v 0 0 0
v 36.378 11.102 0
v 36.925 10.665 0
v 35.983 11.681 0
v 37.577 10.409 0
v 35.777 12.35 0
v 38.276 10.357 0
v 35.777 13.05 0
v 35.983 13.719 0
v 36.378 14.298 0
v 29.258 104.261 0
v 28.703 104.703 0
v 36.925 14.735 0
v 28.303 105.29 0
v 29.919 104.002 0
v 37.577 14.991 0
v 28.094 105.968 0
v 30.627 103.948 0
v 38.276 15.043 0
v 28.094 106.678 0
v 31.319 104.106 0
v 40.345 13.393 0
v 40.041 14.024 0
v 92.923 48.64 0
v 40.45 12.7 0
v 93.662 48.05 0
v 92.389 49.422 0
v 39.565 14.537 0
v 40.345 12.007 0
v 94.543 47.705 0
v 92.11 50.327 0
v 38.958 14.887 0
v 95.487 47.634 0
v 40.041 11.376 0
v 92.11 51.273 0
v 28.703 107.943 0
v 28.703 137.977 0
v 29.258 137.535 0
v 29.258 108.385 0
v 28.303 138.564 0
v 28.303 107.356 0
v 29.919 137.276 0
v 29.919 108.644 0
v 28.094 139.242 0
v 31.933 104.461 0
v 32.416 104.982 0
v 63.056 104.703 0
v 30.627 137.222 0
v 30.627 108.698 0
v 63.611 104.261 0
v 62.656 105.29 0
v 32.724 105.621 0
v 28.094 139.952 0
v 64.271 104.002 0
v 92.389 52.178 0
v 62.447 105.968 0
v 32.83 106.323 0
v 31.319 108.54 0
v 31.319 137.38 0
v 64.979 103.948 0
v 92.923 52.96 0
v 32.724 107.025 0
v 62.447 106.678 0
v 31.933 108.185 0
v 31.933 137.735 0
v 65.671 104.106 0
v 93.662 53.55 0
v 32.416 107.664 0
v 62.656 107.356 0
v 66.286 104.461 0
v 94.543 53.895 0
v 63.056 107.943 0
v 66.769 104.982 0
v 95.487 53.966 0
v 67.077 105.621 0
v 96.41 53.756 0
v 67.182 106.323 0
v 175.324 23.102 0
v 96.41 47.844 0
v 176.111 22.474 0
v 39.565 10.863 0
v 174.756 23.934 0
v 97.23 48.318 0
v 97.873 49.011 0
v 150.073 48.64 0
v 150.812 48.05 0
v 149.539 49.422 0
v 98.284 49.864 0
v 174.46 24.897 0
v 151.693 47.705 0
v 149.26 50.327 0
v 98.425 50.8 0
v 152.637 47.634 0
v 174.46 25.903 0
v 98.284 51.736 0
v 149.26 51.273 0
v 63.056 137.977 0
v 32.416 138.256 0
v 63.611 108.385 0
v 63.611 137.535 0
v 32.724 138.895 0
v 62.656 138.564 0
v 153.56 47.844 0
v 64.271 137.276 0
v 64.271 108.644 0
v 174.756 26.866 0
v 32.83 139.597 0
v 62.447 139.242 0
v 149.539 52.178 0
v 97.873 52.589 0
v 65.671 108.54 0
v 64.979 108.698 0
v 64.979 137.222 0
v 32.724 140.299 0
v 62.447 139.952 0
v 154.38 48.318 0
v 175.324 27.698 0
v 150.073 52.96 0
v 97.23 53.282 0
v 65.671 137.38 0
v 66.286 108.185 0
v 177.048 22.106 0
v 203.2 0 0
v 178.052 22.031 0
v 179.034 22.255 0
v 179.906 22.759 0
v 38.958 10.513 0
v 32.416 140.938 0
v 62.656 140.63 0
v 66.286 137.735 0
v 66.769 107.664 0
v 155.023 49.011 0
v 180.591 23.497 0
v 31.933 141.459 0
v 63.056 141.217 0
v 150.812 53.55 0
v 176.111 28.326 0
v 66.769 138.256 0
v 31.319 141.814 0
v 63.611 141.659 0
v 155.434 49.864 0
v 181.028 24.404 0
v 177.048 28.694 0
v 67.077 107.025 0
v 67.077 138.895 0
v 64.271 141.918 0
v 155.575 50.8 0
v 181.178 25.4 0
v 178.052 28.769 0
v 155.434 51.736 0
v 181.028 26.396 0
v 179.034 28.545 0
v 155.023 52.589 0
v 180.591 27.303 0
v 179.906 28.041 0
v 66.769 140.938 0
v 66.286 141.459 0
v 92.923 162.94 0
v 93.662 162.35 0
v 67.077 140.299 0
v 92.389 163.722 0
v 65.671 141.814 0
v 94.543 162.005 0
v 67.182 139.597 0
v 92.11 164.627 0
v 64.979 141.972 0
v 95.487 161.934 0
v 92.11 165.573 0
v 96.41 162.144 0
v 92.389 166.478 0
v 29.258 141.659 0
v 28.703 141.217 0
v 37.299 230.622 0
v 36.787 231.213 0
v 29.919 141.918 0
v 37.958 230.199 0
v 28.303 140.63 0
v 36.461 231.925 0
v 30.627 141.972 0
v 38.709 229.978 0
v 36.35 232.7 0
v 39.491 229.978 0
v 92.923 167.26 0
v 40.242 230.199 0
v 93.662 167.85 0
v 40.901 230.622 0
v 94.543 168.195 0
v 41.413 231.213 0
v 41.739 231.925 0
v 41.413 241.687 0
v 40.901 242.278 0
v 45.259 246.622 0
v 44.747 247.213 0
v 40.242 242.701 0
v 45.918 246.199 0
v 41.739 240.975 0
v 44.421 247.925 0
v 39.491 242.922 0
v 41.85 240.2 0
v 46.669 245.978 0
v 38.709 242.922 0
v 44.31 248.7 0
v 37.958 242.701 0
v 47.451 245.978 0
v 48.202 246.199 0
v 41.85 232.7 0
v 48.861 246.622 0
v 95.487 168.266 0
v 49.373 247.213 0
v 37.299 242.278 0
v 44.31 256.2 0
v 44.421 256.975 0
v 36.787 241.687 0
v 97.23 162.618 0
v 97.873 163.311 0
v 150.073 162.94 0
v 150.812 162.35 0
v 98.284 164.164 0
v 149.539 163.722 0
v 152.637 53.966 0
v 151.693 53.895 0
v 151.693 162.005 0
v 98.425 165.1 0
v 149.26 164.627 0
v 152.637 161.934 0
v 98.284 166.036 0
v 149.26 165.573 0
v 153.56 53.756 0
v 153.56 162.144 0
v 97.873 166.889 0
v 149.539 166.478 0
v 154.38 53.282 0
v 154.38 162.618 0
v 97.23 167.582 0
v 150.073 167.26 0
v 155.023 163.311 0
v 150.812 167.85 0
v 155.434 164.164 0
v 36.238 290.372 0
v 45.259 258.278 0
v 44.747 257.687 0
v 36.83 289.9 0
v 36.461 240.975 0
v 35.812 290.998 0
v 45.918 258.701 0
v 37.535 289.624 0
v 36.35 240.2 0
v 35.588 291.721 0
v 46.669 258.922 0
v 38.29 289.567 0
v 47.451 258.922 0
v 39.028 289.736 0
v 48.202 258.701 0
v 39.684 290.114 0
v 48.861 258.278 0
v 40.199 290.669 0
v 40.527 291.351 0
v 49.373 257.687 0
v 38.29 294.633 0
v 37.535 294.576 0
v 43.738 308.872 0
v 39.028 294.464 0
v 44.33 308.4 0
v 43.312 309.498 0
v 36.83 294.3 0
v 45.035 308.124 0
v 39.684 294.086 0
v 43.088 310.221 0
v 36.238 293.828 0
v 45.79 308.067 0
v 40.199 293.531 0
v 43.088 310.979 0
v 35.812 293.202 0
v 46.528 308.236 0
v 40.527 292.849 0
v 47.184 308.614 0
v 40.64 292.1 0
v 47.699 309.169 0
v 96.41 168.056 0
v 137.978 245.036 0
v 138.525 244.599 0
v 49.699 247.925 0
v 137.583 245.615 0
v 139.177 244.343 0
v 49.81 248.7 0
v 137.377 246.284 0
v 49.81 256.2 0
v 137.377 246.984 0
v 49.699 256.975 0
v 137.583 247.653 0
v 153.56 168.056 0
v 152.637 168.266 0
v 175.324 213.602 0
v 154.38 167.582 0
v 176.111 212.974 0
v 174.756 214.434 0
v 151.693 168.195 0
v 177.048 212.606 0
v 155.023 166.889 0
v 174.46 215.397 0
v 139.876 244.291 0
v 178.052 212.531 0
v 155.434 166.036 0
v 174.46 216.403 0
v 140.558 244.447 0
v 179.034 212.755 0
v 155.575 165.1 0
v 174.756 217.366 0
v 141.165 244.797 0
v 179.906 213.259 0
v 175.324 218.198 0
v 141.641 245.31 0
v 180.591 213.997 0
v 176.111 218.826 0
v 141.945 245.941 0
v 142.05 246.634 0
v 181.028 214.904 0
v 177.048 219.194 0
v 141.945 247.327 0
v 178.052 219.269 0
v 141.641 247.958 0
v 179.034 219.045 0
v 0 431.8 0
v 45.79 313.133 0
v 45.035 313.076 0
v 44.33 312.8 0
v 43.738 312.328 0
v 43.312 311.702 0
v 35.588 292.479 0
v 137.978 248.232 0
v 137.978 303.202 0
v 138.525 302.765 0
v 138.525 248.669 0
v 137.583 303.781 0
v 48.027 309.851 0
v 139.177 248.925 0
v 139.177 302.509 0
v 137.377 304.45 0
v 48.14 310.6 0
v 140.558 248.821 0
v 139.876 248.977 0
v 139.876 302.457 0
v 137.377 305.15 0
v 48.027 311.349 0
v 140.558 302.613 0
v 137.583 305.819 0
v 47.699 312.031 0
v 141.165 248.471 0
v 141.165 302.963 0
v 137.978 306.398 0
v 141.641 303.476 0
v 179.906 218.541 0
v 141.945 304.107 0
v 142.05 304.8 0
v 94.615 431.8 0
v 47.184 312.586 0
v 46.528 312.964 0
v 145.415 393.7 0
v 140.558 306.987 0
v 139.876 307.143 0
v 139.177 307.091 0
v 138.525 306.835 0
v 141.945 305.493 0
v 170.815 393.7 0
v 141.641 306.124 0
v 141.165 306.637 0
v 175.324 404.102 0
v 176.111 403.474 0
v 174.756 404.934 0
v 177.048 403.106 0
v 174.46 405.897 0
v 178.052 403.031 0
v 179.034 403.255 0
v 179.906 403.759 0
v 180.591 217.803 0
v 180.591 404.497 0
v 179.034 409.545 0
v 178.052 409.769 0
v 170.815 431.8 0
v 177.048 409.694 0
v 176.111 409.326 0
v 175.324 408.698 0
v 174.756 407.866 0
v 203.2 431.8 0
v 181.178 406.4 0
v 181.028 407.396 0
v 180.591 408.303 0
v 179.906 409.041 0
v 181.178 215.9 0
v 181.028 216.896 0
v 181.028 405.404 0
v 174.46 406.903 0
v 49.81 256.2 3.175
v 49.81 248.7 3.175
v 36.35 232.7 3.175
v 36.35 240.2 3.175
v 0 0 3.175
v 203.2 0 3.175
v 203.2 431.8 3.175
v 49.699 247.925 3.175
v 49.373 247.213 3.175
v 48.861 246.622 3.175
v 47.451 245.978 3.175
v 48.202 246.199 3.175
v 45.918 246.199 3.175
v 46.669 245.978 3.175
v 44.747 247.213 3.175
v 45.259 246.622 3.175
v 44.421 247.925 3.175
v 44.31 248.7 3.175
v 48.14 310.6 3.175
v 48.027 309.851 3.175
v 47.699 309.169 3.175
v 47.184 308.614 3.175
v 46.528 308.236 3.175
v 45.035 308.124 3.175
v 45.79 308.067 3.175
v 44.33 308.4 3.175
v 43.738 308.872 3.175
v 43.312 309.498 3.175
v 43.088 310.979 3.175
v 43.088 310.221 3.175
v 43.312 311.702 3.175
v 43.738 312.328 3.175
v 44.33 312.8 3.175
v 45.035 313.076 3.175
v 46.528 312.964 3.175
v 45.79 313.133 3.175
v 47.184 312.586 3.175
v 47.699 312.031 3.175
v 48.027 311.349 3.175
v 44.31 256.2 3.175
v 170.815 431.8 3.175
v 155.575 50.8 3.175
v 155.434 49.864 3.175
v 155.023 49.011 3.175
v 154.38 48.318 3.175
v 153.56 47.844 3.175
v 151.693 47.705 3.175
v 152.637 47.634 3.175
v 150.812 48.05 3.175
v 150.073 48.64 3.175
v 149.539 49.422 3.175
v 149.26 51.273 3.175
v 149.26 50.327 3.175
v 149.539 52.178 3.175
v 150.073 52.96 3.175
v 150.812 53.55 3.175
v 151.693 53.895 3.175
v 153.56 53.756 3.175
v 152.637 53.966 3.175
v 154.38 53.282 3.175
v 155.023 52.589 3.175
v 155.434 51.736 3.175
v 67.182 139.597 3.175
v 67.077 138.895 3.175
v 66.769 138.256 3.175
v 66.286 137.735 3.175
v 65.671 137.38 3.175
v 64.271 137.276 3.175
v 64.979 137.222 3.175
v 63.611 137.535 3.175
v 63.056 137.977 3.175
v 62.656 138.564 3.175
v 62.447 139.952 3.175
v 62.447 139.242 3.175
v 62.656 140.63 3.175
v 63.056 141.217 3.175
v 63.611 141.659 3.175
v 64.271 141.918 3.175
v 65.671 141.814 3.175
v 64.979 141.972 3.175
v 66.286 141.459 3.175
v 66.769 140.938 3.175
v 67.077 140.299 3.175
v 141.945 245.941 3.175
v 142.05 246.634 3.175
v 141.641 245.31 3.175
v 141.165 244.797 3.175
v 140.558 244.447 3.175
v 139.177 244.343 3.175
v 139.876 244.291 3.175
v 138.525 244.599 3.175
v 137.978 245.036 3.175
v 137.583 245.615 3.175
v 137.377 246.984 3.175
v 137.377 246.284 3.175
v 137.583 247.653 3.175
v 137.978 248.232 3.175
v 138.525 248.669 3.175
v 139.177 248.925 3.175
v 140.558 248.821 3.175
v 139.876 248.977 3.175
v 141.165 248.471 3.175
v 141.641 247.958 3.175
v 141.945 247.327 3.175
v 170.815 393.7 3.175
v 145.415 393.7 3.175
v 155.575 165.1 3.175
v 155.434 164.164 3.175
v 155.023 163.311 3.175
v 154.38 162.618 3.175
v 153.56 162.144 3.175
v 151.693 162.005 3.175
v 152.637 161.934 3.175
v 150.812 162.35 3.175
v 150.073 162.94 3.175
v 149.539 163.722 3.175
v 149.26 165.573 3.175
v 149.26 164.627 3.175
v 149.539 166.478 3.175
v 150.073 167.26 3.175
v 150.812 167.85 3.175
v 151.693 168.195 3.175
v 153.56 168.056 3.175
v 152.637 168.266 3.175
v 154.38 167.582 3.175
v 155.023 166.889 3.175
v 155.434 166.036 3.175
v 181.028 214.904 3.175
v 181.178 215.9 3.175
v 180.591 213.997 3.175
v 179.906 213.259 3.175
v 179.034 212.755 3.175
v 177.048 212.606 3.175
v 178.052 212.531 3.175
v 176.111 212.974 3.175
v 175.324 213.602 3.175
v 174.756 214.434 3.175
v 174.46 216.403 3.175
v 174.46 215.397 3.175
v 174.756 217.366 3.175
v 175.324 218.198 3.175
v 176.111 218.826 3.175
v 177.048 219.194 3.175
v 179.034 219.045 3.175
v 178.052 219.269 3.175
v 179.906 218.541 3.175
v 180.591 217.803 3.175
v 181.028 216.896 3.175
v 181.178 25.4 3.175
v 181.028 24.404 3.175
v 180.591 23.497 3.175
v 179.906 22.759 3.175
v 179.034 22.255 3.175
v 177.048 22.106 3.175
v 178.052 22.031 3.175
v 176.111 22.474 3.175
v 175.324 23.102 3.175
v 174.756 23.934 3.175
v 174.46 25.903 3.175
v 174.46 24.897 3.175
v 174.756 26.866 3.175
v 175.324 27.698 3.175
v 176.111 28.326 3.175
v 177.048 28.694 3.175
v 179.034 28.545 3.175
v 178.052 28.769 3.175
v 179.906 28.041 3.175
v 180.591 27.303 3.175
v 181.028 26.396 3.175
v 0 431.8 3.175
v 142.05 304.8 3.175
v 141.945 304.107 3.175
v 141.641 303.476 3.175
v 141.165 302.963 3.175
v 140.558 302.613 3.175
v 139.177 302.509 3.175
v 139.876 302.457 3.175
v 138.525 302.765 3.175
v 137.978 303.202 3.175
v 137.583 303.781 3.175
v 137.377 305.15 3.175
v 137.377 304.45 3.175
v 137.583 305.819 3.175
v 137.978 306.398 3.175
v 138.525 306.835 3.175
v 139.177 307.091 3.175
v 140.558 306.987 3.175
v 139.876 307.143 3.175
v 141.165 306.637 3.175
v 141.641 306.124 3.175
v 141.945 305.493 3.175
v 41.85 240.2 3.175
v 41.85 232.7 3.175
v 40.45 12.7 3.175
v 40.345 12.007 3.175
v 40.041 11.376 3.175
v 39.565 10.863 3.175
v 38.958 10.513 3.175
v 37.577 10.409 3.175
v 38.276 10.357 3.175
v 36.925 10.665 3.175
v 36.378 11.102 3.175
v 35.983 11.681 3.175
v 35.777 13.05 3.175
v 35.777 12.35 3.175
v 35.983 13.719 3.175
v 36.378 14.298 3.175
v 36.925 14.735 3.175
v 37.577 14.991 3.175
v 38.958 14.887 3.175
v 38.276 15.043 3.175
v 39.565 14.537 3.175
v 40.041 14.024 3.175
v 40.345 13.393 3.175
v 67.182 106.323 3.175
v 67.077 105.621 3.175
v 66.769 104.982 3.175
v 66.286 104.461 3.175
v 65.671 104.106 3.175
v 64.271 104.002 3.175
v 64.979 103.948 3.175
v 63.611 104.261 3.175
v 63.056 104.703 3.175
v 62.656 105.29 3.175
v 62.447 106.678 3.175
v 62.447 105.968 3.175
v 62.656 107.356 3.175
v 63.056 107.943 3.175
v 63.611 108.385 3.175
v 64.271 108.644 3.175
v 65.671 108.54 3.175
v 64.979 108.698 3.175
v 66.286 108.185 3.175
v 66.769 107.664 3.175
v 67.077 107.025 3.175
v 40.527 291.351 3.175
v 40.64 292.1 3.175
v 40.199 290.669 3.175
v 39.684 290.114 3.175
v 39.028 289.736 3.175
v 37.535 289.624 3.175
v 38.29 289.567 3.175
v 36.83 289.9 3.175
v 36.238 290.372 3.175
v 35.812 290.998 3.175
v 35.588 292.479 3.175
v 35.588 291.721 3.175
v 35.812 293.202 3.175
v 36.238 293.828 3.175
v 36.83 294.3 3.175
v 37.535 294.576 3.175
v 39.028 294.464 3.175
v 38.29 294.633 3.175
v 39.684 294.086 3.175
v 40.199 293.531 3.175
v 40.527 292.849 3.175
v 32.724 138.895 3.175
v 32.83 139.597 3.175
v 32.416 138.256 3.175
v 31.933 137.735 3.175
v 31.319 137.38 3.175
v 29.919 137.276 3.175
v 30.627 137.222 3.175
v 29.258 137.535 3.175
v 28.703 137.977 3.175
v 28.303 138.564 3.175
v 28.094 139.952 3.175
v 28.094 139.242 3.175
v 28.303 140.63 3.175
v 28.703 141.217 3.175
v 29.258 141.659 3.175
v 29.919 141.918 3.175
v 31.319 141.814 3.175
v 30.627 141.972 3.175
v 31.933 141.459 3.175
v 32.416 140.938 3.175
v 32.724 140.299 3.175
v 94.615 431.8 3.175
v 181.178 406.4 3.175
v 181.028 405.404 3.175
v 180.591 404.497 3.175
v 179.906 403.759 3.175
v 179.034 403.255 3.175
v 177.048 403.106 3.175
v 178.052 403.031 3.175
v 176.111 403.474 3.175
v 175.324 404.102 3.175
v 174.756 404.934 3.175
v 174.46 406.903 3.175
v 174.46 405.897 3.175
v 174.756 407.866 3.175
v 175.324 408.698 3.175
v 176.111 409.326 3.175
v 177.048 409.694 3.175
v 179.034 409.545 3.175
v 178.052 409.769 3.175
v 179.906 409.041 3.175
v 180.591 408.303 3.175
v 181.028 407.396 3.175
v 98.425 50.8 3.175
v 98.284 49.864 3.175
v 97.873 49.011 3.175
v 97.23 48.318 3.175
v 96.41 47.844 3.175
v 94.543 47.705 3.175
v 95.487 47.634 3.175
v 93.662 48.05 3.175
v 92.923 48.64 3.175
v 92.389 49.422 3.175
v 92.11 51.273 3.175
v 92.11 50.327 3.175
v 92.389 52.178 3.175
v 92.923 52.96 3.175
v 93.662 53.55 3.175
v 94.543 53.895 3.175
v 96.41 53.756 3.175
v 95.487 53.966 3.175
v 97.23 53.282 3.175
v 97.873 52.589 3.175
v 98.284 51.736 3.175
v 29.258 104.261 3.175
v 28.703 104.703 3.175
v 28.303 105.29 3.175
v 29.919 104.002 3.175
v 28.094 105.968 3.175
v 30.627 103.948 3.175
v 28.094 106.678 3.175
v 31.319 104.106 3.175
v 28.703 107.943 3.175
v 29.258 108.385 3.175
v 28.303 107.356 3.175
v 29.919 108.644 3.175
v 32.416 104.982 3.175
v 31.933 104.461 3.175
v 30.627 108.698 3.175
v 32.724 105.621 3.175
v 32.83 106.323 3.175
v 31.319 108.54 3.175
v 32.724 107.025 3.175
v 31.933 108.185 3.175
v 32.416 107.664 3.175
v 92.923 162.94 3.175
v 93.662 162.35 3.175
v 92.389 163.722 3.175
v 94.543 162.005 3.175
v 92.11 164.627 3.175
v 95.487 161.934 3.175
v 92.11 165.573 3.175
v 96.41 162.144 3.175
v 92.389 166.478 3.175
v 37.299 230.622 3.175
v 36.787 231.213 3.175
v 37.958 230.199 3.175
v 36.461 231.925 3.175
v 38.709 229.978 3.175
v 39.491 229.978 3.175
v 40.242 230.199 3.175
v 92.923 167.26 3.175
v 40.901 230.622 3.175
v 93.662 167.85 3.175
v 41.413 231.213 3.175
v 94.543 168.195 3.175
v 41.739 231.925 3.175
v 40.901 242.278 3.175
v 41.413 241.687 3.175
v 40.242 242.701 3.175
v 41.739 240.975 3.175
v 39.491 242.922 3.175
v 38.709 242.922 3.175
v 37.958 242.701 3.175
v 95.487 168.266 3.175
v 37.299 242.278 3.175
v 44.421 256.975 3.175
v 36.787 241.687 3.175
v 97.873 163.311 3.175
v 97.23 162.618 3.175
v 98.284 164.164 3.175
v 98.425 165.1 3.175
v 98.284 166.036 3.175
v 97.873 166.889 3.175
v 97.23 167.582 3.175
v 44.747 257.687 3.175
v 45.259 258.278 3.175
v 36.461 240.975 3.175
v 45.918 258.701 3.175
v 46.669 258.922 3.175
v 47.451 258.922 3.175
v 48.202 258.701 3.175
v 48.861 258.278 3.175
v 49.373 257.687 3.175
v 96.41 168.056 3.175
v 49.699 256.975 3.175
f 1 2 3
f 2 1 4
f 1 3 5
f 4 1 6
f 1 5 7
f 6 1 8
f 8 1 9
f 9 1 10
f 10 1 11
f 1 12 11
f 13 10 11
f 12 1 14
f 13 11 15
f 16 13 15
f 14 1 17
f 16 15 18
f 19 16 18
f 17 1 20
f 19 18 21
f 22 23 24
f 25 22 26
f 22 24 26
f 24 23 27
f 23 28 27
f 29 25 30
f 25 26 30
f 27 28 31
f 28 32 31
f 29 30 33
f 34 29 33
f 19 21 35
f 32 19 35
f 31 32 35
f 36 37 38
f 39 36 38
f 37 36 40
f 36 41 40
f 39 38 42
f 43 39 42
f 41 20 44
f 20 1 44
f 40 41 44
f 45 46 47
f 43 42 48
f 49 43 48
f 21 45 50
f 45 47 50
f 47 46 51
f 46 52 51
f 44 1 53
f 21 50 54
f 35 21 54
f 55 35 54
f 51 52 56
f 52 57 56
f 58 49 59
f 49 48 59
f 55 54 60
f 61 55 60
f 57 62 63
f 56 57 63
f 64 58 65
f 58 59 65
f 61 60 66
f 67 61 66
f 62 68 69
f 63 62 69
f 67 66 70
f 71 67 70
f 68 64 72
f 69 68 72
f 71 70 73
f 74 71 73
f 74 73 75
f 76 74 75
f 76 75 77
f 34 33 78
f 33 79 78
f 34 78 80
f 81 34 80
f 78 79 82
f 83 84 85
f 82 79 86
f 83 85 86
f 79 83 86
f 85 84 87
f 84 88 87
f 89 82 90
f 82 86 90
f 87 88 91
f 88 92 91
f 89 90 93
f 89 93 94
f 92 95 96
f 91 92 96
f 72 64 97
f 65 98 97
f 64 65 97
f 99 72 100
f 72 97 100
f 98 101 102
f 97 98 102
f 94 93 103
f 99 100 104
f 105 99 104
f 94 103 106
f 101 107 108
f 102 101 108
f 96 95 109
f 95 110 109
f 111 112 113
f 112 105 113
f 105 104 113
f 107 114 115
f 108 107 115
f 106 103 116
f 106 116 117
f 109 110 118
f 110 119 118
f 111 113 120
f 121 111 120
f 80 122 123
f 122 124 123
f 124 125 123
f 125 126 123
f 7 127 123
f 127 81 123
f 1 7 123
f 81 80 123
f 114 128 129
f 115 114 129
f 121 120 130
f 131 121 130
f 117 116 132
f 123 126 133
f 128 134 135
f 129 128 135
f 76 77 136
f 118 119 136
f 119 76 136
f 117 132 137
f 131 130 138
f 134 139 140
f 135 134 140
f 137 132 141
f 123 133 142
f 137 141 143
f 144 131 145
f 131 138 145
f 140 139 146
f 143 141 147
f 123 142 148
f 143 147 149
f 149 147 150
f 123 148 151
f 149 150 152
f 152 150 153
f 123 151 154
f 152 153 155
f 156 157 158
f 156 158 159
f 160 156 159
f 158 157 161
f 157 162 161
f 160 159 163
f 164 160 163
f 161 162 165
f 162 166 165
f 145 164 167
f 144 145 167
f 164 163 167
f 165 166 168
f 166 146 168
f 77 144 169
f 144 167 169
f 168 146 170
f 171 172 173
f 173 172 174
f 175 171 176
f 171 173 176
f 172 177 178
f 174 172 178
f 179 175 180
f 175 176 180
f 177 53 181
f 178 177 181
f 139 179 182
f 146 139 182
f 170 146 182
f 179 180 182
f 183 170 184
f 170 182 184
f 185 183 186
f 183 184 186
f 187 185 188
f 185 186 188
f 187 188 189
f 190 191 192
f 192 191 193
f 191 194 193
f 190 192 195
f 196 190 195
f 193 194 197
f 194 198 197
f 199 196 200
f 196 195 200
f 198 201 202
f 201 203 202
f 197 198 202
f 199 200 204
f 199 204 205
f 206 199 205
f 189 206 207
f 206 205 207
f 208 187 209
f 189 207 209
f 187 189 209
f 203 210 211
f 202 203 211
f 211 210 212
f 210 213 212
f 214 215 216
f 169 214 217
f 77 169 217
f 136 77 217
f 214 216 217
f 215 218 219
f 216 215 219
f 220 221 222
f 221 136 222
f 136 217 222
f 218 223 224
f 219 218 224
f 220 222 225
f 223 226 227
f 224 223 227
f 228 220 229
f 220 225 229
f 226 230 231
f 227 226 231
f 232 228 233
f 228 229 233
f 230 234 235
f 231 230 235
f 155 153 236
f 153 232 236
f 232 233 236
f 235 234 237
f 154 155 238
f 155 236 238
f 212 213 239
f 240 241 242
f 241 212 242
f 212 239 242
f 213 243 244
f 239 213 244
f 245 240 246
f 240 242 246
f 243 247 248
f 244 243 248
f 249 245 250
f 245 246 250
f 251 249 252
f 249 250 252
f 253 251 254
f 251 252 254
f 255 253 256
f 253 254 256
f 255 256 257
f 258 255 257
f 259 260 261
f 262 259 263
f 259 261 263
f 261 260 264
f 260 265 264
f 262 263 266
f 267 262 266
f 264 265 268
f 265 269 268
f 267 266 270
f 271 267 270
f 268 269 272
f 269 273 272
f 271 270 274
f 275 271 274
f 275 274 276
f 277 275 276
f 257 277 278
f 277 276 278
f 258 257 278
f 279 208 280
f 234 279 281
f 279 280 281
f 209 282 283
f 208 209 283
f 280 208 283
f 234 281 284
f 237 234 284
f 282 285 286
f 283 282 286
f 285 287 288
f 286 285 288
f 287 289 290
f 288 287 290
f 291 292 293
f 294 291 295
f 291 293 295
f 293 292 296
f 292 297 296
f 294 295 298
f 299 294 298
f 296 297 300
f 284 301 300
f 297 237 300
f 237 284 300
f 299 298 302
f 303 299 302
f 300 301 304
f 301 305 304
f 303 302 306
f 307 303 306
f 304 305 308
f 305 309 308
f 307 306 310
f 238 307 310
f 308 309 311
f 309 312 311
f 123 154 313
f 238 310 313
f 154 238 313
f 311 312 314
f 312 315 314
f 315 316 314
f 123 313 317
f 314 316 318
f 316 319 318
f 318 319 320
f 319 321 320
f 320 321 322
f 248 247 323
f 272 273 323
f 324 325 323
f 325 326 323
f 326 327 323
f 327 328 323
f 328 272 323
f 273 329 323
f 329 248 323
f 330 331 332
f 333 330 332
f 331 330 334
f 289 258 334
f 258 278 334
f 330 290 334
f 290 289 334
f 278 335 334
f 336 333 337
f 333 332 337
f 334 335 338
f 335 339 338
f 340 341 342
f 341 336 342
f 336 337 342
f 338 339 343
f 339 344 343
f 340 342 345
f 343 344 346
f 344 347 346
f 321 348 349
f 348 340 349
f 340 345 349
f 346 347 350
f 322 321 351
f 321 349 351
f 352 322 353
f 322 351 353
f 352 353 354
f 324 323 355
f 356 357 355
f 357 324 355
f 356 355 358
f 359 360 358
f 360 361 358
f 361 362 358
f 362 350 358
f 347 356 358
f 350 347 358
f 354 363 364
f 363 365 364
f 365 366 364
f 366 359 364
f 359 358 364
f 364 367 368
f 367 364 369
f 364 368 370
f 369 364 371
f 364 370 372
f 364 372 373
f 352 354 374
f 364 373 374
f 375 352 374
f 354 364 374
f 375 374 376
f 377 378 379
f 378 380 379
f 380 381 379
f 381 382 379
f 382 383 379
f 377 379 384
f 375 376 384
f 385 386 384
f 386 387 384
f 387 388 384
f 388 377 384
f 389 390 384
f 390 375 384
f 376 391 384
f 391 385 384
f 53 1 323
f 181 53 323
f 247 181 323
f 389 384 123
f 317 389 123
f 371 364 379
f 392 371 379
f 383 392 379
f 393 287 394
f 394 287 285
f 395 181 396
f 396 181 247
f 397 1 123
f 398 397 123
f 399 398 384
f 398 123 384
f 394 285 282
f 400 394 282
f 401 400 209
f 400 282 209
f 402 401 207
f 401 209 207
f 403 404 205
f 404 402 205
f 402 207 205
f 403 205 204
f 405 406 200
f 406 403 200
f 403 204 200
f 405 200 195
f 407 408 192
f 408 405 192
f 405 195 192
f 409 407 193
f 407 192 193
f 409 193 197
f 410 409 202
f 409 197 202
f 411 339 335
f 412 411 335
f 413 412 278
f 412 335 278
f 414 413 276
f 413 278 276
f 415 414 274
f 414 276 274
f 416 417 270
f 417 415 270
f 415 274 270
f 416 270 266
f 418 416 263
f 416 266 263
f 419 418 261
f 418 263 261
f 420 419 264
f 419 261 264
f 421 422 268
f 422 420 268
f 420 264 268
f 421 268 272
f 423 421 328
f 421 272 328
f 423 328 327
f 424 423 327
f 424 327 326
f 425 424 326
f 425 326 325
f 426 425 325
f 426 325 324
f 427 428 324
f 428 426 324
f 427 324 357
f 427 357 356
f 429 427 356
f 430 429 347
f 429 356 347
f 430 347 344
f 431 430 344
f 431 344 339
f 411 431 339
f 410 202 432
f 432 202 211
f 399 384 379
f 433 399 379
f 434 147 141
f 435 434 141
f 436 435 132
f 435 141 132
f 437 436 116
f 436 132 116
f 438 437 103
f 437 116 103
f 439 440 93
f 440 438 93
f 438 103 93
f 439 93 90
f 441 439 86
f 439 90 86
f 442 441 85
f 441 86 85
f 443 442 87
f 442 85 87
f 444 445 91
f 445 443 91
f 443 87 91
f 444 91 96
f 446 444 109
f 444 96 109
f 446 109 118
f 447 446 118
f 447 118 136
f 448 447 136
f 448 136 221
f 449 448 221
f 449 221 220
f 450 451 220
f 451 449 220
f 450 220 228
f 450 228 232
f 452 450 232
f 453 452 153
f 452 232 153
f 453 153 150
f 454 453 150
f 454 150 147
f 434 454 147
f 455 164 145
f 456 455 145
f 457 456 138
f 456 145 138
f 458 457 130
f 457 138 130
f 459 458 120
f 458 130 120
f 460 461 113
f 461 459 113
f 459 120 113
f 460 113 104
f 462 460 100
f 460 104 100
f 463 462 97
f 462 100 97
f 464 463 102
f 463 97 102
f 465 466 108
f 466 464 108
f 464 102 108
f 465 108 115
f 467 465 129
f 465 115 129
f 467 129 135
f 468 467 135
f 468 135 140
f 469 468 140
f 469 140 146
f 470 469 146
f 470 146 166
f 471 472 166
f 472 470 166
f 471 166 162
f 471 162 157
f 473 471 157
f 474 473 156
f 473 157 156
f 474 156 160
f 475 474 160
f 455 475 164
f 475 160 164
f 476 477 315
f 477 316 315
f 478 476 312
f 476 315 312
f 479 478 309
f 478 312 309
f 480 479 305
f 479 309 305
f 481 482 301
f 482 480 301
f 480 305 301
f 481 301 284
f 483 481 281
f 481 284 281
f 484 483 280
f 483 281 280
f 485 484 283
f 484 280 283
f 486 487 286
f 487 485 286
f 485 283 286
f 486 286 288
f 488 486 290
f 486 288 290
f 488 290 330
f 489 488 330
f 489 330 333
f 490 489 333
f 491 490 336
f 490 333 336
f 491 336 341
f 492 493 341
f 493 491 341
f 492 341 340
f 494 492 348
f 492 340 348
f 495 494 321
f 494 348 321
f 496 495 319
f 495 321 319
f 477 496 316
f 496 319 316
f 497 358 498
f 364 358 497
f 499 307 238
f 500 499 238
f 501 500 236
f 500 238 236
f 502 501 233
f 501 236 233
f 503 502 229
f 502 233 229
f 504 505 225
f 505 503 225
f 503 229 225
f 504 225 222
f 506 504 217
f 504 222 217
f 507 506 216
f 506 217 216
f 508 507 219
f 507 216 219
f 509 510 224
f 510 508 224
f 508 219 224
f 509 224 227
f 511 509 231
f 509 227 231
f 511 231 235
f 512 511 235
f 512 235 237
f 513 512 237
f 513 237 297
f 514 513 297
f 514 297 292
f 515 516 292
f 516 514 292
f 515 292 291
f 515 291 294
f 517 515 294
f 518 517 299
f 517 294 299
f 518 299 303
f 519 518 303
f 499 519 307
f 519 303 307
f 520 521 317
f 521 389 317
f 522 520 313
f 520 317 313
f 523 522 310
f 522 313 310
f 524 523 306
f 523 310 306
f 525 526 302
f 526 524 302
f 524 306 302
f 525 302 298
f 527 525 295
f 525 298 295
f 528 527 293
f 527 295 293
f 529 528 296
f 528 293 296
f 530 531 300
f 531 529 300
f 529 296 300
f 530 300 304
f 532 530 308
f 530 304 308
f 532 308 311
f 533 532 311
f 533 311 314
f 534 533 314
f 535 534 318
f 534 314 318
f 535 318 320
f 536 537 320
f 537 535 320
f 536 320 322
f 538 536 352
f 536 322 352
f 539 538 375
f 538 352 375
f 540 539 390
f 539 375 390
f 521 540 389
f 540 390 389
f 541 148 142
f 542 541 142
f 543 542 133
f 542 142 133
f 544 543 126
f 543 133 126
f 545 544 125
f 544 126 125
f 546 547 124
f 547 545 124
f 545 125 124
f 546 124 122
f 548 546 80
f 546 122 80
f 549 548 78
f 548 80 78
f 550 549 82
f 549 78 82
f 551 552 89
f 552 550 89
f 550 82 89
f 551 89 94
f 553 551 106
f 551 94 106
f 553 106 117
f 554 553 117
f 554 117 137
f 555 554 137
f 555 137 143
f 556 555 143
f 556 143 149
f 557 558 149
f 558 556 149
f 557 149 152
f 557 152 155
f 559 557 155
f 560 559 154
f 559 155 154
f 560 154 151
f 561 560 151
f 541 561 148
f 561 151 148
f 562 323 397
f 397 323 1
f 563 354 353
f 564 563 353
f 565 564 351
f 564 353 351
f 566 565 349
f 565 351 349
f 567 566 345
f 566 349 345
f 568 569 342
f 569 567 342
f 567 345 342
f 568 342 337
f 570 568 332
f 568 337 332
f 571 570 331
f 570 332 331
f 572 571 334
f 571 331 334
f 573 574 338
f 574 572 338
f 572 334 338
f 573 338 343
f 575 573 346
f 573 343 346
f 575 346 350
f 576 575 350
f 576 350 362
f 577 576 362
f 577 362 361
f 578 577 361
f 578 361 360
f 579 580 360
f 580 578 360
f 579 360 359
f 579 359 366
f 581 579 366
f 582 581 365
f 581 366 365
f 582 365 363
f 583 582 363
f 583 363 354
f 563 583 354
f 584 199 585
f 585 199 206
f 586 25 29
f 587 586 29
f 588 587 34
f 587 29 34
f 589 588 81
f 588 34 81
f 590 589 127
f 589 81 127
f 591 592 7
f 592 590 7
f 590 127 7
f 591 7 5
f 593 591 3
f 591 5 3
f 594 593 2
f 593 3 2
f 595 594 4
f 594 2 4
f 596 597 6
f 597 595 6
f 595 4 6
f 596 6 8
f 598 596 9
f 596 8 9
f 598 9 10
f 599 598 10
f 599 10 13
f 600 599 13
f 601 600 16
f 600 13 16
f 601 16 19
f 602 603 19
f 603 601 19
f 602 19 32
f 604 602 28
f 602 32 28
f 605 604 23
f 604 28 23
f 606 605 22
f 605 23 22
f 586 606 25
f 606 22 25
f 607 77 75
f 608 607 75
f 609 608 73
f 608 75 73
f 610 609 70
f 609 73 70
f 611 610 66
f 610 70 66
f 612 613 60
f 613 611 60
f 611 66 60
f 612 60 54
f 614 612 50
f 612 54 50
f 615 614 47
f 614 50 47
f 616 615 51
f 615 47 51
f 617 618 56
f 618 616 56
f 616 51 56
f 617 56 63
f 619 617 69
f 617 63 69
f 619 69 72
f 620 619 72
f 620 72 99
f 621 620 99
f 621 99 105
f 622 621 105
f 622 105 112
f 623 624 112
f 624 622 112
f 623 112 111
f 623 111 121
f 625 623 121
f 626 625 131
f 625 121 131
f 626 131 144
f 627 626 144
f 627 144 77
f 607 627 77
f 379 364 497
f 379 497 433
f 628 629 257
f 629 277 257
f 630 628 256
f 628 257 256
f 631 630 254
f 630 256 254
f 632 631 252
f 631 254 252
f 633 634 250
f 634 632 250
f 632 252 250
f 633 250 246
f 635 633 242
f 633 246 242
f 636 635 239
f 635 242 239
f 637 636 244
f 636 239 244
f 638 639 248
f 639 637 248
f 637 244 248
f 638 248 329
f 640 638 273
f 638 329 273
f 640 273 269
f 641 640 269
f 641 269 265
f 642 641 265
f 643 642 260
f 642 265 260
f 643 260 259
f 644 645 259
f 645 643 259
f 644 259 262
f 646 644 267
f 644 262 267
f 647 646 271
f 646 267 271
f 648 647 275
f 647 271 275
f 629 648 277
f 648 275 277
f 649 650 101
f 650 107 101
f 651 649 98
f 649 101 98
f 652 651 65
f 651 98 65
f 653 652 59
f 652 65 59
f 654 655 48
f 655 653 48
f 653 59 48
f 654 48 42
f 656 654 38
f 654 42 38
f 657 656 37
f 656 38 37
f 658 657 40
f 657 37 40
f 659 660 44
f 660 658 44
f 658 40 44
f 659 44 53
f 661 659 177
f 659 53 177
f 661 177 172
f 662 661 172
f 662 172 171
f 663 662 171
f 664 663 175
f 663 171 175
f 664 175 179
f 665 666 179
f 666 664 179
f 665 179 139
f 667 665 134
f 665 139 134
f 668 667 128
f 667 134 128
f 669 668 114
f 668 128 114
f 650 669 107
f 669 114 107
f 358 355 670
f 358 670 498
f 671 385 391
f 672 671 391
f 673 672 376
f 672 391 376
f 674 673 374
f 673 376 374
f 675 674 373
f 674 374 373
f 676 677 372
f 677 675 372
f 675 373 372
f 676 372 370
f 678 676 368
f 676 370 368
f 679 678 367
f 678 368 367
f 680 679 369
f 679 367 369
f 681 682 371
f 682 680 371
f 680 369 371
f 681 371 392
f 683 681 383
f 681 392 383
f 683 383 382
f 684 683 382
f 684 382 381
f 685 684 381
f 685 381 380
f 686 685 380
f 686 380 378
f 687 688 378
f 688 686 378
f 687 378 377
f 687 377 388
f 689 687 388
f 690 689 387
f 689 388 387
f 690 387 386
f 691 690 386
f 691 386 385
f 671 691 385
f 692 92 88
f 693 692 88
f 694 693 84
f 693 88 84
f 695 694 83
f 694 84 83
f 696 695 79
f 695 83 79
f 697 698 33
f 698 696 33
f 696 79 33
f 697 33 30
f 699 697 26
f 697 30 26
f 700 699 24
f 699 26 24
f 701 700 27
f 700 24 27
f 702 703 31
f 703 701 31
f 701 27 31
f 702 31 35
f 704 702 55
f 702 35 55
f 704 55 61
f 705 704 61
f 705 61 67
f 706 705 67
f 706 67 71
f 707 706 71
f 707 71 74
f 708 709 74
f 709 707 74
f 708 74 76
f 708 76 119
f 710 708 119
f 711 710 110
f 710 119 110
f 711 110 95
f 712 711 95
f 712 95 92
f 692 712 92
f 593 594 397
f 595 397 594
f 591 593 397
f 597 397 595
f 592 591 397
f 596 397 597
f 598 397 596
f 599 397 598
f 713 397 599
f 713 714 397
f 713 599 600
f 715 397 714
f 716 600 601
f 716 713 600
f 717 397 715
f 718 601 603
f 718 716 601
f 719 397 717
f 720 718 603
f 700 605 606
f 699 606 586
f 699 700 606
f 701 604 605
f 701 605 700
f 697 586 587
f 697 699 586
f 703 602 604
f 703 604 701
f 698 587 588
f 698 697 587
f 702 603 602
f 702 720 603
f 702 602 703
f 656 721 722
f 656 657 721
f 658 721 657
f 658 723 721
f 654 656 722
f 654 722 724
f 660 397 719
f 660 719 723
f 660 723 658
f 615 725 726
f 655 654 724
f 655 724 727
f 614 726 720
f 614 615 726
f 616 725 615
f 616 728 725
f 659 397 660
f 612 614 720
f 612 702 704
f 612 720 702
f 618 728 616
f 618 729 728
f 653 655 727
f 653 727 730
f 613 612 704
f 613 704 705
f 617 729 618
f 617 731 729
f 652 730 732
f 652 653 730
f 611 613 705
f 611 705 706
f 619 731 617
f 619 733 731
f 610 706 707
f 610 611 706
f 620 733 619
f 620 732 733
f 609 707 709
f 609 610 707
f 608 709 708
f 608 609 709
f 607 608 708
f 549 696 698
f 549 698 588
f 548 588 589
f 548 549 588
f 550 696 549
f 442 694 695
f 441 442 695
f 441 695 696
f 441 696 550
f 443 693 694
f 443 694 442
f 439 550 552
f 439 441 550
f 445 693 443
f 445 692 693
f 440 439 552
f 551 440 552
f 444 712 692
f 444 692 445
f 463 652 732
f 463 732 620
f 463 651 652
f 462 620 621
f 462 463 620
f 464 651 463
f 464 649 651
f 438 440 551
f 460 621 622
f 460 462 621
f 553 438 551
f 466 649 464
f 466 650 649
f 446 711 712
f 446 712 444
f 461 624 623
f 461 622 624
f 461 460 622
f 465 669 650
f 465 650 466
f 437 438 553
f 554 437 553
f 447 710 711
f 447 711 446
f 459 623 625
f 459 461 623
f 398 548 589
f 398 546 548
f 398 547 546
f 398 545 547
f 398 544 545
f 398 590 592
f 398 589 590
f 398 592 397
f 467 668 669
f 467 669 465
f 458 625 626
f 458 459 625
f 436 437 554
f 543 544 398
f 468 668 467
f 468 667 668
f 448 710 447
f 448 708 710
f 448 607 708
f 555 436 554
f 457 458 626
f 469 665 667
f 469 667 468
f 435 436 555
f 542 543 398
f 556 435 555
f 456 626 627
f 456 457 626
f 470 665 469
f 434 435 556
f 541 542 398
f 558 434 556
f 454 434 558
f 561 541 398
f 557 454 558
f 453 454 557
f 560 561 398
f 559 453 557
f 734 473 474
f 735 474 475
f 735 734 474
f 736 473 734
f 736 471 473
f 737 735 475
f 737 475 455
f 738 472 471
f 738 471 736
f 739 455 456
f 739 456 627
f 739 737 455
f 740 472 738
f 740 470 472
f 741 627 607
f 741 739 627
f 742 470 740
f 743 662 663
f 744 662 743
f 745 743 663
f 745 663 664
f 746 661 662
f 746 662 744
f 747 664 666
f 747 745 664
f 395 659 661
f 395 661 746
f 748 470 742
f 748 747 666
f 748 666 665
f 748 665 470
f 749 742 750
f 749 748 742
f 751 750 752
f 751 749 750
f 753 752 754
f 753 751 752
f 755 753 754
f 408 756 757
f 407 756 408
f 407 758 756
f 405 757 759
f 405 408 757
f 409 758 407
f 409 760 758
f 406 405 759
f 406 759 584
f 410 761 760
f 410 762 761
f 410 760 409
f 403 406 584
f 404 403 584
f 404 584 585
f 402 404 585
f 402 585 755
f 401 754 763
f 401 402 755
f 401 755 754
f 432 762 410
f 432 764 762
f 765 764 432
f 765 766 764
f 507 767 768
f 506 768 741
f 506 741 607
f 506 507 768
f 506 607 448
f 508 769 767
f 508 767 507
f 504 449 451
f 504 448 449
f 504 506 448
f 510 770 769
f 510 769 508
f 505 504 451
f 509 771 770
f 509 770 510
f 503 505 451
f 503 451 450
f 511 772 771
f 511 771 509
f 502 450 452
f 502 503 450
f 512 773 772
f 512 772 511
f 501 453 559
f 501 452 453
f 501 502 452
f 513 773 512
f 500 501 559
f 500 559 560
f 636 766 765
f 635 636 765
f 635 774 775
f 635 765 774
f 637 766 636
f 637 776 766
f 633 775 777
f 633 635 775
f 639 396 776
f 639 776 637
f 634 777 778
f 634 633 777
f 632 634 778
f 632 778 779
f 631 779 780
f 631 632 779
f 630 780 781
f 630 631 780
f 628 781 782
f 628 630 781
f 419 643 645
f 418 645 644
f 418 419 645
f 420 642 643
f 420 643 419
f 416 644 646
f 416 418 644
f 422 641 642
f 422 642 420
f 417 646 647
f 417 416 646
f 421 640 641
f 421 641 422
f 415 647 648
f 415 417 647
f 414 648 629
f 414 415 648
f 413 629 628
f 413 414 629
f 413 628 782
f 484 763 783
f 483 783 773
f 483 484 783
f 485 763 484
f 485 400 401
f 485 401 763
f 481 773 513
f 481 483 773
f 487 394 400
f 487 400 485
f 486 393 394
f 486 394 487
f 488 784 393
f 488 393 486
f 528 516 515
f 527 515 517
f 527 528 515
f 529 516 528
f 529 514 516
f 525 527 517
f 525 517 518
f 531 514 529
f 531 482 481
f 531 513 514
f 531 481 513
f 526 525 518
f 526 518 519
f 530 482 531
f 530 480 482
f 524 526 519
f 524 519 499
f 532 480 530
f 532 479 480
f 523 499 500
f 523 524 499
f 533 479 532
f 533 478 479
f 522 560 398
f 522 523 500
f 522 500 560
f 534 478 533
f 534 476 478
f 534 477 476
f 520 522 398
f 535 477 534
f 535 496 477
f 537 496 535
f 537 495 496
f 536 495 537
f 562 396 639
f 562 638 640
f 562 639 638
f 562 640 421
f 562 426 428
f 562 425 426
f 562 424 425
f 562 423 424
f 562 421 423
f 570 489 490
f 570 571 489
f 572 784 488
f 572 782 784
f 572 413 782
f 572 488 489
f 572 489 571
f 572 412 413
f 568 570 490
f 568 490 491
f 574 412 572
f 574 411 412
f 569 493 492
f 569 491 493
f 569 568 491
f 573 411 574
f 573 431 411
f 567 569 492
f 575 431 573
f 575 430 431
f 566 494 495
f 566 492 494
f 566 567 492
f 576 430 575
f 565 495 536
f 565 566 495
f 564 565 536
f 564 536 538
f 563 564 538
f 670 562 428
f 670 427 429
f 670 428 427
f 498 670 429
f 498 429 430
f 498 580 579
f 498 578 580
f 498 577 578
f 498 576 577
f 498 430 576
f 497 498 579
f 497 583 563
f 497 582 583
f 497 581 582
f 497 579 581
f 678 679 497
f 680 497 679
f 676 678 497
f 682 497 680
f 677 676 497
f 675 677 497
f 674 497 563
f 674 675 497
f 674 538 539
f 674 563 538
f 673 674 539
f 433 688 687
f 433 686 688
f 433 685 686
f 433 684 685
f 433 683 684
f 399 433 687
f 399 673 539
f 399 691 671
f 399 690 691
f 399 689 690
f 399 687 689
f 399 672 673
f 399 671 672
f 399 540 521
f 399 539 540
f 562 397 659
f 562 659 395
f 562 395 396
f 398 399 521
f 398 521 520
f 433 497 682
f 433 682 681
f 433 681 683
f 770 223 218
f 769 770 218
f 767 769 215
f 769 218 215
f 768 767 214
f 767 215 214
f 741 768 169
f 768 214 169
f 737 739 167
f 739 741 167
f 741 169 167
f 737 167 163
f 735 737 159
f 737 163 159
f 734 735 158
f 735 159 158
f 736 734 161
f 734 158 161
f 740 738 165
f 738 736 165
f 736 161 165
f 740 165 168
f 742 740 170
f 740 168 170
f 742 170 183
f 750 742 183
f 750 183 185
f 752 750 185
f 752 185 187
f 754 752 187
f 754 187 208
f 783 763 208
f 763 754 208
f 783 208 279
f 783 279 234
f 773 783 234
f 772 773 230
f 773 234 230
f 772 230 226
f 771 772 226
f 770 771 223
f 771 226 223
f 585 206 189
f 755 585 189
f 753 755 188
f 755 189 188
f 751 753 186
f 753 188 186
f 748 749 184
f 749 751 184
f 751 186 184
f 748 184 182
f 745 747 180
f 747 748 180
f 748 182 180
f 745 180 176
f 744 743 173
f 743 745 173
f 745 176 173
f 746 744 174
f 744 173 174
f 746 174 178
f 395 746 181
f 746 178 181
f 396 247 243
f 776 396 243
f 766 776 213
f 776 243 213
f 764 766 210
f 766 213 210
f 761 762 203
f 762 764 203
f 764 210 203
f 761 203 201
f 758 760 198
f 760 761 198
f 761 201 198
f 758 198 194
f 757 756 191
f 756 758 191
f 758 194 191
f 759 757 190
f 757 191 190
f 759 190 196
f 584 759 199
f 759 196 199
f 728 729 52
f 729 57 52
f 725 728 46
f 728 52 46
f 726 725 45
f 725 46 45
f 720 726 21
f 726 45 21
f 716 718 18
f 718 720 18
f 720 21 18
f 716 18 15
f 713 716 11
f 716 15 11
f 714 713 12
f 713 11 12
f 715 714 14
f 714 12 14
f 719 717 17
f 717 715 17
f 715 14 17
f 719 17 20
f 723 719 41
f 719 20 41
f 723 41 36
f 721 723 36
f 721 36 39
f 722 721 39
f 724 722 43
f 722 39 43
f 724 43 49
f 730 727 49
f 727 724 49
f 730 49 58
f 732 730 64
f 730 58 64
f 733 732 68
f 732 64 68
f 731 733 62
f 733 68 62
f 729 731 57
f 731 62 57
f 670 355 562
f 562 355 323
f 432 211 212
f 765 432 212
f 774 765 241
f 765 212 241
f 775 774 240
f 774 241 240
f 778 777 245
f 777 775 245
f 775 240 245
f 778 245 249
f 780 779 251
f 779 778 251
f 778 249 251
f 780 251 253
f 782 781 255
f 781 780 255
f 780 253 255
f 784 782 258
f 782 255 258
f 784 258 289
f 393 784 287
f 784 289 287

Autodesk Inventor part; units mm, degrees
ref_plane "YZ Plane" through (0, 0, 0) normal (1, 0, 0) x (0, 1, 0)
ref_plane "XZ Plane" through (0, 0, 0) normal (0, 1, 0) x (-1, 0, 0)
ref_plane "XY Plane" through (0, 0, 0) normal (0, 0, 1) x (1, 0, 0)
sketch "Sketch1" plane through (0, 0, 0) normal (0, 0, 1) x (1, 0, 0)
  line L0 (0, 0) -> (203.2, 0)
  line L1 (203.2, 0) -> (203.2, 431.8)
  line L2 (203.2, 431.8) -> (170.815, 431.8)
  line L3 (0, 431.8) -> (0, 0)
  circle A0 centre (177.8, 406.4) radius 3.3782
  circle A1 centre (177.8, 215.9) radius 3.3782
  circle A2 centre (177.8, 25.4) radius 3.3782
  line L4 (203.2, 215.9) -> (0, 215.9) construction
  line L5 (94.615, 431.8) -> (145.415, 393.7)
  line L6 (145.415, 393.7) -> (170.815, 393.7)
  line L7 (170.815, 393.7) -> (170.815, 431.8)
  line L8 (94.615, 431.8) -> (0, 431.8)
  line L9 (170.815, 431.8) -> (94.615, 431.8)
  circle A3 centre (139.7, 304.8) radius 2.3495
  line L10 (139.7, 304.8) -> (139.7, 246.634) construction
  circle A4 centre (139.7, 246.634) radius 2.3495
  circle A5 centre (45.6, 310.6) radius 2.54
  circle A6 centre (38.1, 292.1) radius 2.54
  line L11 (45.6, 310.6) -> (38.1, 310.6) construction
  line L12 (38.1, 310.6) -> (38.1, 292.1) construction
  line L13 (38.1, 292.1) -> (45.6, 292.1) construction
  line L14 (45.6, 292.1) -> (45.6, 310.6) construction
  circle A7 centre (38.1, 12.7) radius 2.3495
  line L15 (71.1544, 389.1684) -> (109.2544, 389.1684) construction
  line L16 (109.2544, 389.1684) -> (109.2544, 370.1184) construction
  line L17 (109.2544, 370.1184) -> (71.1544, 370.1184) construction
  line L18 (71.1544, 370.1184) -> (71.1544, 389.1684) construction
  line L19 (95.25, 165.1) -> (152.4, 165.1) construction
  line L20 (152.4, 165.1) -> (152.4, 50.8) construction
  line L21 (152.4, 50.8) -> (95.25, 50.8) construction
  line L22 (95.25, 50.8) -> (95.25, 165.1) construction
  circle A8 centre (95.25, 165.1) radius 3.175
  circle A9 centre (152.4, 165.1) radius 3.175
  circle A10 centre (152.4, 50.8) radius 3.175
  circle A11 centre (95.25, 50.8) radius 3.175
  line L23 (30.6, 229.55) -> (30.6, 259.55) projected
  arc A12 (30.6, 229.55) -> (34.6, 225.55) centre (34.6, 229.55) ccw projected
  line L24 (52.6, 225.55) -> (34.6, 225.55) projected
  line L25 (52.6, 225.55) -> (52.6, 263.55) projected
  line L26 (34.6, 263.55) -> (52.6, 263.55) projected
  arc A13 (34.6, 263.55) -> (30.6, 259.55) centre (34.6, 259.55) ccw projected
  arc A14 (49.81, 256.2) -> (44.31, 256.2) centre (47.06, 256.2) ccw projected
  line L27 (49.81, 256.2) -> (49.81, 248.7) projected
  arc A15 (44.31, 248.7) -> (49.81, 248.7) centre (47.06, 248.7) ccw projected
  line L28 (44.31, 248.7) -> (44.31, 256.2) projected
  arc A16 (41.85, 240.2) -> (36.35, 240.2) centre (39.1, 240.2) ccw projected
  line L29 (41.85, 240.2) -> (41.85, 232.7) projected
  arc A17 (36.35, 232.7) -> (41.85, 232.7) centre (39.1, 232.7) ccw projected
  line L30 (36.35, 232.7) -> (36.35, 240.2) projected
  circle A18 centre (30.4488, 139.597) radius 2.3812 projected
  circle A19 centre (64.8012, 139.597) radius 2.3812 projected
  circle A20 centre (30.4488, 106.323) radius 2.3812 projected
  circle A21 centre (64.8012, 106.323) radius 2.3812 projected
  dimension "d0" = 6.7564
  dimension "d3" = 190.5
  dimension "d8" = 25.4
  dimension "d9" = 431.8
  dimension "d10" = 203.2
  dimension "d14" = 38.1
  dimension "d15" = 76.2
  dimension "d16" = 25.4
  dimension "d17" = 4.699
  dimension "d18" = 58.166
  dimension "d19" = 63.5
  dimension "d20" = 127
  dimension "d26" = 5.08
  dimension "d27" = 18.5
  dimension "d28" = 7.5
  dimension "d29" = 38.1
  dimension "d30" = 76.2
  dimension "d31" = 4.699
  dimension "d32" = 38.1
  dimension "d33" = 12.7
  dimension "d34" = 32.385
  dimension "d35" = 19.05
  dimension "d36" = 38.1
  dimension "d37" = 57.15
  dimension "d38" = 6.35
  dimension "d39" = 114.3
  dimension "d40" = 50.8
  dimension "d41" = 50.8
extrude "Extrusion1" add sketch "Sketch1" along normal blind 3.175 contours L3 L8 L5 L6 L7 L2 L1 L0 | L23 A13 L26 L25 L24 A12
properties part number "Electrical Board 2" material "Polycarbonate, Clear"
